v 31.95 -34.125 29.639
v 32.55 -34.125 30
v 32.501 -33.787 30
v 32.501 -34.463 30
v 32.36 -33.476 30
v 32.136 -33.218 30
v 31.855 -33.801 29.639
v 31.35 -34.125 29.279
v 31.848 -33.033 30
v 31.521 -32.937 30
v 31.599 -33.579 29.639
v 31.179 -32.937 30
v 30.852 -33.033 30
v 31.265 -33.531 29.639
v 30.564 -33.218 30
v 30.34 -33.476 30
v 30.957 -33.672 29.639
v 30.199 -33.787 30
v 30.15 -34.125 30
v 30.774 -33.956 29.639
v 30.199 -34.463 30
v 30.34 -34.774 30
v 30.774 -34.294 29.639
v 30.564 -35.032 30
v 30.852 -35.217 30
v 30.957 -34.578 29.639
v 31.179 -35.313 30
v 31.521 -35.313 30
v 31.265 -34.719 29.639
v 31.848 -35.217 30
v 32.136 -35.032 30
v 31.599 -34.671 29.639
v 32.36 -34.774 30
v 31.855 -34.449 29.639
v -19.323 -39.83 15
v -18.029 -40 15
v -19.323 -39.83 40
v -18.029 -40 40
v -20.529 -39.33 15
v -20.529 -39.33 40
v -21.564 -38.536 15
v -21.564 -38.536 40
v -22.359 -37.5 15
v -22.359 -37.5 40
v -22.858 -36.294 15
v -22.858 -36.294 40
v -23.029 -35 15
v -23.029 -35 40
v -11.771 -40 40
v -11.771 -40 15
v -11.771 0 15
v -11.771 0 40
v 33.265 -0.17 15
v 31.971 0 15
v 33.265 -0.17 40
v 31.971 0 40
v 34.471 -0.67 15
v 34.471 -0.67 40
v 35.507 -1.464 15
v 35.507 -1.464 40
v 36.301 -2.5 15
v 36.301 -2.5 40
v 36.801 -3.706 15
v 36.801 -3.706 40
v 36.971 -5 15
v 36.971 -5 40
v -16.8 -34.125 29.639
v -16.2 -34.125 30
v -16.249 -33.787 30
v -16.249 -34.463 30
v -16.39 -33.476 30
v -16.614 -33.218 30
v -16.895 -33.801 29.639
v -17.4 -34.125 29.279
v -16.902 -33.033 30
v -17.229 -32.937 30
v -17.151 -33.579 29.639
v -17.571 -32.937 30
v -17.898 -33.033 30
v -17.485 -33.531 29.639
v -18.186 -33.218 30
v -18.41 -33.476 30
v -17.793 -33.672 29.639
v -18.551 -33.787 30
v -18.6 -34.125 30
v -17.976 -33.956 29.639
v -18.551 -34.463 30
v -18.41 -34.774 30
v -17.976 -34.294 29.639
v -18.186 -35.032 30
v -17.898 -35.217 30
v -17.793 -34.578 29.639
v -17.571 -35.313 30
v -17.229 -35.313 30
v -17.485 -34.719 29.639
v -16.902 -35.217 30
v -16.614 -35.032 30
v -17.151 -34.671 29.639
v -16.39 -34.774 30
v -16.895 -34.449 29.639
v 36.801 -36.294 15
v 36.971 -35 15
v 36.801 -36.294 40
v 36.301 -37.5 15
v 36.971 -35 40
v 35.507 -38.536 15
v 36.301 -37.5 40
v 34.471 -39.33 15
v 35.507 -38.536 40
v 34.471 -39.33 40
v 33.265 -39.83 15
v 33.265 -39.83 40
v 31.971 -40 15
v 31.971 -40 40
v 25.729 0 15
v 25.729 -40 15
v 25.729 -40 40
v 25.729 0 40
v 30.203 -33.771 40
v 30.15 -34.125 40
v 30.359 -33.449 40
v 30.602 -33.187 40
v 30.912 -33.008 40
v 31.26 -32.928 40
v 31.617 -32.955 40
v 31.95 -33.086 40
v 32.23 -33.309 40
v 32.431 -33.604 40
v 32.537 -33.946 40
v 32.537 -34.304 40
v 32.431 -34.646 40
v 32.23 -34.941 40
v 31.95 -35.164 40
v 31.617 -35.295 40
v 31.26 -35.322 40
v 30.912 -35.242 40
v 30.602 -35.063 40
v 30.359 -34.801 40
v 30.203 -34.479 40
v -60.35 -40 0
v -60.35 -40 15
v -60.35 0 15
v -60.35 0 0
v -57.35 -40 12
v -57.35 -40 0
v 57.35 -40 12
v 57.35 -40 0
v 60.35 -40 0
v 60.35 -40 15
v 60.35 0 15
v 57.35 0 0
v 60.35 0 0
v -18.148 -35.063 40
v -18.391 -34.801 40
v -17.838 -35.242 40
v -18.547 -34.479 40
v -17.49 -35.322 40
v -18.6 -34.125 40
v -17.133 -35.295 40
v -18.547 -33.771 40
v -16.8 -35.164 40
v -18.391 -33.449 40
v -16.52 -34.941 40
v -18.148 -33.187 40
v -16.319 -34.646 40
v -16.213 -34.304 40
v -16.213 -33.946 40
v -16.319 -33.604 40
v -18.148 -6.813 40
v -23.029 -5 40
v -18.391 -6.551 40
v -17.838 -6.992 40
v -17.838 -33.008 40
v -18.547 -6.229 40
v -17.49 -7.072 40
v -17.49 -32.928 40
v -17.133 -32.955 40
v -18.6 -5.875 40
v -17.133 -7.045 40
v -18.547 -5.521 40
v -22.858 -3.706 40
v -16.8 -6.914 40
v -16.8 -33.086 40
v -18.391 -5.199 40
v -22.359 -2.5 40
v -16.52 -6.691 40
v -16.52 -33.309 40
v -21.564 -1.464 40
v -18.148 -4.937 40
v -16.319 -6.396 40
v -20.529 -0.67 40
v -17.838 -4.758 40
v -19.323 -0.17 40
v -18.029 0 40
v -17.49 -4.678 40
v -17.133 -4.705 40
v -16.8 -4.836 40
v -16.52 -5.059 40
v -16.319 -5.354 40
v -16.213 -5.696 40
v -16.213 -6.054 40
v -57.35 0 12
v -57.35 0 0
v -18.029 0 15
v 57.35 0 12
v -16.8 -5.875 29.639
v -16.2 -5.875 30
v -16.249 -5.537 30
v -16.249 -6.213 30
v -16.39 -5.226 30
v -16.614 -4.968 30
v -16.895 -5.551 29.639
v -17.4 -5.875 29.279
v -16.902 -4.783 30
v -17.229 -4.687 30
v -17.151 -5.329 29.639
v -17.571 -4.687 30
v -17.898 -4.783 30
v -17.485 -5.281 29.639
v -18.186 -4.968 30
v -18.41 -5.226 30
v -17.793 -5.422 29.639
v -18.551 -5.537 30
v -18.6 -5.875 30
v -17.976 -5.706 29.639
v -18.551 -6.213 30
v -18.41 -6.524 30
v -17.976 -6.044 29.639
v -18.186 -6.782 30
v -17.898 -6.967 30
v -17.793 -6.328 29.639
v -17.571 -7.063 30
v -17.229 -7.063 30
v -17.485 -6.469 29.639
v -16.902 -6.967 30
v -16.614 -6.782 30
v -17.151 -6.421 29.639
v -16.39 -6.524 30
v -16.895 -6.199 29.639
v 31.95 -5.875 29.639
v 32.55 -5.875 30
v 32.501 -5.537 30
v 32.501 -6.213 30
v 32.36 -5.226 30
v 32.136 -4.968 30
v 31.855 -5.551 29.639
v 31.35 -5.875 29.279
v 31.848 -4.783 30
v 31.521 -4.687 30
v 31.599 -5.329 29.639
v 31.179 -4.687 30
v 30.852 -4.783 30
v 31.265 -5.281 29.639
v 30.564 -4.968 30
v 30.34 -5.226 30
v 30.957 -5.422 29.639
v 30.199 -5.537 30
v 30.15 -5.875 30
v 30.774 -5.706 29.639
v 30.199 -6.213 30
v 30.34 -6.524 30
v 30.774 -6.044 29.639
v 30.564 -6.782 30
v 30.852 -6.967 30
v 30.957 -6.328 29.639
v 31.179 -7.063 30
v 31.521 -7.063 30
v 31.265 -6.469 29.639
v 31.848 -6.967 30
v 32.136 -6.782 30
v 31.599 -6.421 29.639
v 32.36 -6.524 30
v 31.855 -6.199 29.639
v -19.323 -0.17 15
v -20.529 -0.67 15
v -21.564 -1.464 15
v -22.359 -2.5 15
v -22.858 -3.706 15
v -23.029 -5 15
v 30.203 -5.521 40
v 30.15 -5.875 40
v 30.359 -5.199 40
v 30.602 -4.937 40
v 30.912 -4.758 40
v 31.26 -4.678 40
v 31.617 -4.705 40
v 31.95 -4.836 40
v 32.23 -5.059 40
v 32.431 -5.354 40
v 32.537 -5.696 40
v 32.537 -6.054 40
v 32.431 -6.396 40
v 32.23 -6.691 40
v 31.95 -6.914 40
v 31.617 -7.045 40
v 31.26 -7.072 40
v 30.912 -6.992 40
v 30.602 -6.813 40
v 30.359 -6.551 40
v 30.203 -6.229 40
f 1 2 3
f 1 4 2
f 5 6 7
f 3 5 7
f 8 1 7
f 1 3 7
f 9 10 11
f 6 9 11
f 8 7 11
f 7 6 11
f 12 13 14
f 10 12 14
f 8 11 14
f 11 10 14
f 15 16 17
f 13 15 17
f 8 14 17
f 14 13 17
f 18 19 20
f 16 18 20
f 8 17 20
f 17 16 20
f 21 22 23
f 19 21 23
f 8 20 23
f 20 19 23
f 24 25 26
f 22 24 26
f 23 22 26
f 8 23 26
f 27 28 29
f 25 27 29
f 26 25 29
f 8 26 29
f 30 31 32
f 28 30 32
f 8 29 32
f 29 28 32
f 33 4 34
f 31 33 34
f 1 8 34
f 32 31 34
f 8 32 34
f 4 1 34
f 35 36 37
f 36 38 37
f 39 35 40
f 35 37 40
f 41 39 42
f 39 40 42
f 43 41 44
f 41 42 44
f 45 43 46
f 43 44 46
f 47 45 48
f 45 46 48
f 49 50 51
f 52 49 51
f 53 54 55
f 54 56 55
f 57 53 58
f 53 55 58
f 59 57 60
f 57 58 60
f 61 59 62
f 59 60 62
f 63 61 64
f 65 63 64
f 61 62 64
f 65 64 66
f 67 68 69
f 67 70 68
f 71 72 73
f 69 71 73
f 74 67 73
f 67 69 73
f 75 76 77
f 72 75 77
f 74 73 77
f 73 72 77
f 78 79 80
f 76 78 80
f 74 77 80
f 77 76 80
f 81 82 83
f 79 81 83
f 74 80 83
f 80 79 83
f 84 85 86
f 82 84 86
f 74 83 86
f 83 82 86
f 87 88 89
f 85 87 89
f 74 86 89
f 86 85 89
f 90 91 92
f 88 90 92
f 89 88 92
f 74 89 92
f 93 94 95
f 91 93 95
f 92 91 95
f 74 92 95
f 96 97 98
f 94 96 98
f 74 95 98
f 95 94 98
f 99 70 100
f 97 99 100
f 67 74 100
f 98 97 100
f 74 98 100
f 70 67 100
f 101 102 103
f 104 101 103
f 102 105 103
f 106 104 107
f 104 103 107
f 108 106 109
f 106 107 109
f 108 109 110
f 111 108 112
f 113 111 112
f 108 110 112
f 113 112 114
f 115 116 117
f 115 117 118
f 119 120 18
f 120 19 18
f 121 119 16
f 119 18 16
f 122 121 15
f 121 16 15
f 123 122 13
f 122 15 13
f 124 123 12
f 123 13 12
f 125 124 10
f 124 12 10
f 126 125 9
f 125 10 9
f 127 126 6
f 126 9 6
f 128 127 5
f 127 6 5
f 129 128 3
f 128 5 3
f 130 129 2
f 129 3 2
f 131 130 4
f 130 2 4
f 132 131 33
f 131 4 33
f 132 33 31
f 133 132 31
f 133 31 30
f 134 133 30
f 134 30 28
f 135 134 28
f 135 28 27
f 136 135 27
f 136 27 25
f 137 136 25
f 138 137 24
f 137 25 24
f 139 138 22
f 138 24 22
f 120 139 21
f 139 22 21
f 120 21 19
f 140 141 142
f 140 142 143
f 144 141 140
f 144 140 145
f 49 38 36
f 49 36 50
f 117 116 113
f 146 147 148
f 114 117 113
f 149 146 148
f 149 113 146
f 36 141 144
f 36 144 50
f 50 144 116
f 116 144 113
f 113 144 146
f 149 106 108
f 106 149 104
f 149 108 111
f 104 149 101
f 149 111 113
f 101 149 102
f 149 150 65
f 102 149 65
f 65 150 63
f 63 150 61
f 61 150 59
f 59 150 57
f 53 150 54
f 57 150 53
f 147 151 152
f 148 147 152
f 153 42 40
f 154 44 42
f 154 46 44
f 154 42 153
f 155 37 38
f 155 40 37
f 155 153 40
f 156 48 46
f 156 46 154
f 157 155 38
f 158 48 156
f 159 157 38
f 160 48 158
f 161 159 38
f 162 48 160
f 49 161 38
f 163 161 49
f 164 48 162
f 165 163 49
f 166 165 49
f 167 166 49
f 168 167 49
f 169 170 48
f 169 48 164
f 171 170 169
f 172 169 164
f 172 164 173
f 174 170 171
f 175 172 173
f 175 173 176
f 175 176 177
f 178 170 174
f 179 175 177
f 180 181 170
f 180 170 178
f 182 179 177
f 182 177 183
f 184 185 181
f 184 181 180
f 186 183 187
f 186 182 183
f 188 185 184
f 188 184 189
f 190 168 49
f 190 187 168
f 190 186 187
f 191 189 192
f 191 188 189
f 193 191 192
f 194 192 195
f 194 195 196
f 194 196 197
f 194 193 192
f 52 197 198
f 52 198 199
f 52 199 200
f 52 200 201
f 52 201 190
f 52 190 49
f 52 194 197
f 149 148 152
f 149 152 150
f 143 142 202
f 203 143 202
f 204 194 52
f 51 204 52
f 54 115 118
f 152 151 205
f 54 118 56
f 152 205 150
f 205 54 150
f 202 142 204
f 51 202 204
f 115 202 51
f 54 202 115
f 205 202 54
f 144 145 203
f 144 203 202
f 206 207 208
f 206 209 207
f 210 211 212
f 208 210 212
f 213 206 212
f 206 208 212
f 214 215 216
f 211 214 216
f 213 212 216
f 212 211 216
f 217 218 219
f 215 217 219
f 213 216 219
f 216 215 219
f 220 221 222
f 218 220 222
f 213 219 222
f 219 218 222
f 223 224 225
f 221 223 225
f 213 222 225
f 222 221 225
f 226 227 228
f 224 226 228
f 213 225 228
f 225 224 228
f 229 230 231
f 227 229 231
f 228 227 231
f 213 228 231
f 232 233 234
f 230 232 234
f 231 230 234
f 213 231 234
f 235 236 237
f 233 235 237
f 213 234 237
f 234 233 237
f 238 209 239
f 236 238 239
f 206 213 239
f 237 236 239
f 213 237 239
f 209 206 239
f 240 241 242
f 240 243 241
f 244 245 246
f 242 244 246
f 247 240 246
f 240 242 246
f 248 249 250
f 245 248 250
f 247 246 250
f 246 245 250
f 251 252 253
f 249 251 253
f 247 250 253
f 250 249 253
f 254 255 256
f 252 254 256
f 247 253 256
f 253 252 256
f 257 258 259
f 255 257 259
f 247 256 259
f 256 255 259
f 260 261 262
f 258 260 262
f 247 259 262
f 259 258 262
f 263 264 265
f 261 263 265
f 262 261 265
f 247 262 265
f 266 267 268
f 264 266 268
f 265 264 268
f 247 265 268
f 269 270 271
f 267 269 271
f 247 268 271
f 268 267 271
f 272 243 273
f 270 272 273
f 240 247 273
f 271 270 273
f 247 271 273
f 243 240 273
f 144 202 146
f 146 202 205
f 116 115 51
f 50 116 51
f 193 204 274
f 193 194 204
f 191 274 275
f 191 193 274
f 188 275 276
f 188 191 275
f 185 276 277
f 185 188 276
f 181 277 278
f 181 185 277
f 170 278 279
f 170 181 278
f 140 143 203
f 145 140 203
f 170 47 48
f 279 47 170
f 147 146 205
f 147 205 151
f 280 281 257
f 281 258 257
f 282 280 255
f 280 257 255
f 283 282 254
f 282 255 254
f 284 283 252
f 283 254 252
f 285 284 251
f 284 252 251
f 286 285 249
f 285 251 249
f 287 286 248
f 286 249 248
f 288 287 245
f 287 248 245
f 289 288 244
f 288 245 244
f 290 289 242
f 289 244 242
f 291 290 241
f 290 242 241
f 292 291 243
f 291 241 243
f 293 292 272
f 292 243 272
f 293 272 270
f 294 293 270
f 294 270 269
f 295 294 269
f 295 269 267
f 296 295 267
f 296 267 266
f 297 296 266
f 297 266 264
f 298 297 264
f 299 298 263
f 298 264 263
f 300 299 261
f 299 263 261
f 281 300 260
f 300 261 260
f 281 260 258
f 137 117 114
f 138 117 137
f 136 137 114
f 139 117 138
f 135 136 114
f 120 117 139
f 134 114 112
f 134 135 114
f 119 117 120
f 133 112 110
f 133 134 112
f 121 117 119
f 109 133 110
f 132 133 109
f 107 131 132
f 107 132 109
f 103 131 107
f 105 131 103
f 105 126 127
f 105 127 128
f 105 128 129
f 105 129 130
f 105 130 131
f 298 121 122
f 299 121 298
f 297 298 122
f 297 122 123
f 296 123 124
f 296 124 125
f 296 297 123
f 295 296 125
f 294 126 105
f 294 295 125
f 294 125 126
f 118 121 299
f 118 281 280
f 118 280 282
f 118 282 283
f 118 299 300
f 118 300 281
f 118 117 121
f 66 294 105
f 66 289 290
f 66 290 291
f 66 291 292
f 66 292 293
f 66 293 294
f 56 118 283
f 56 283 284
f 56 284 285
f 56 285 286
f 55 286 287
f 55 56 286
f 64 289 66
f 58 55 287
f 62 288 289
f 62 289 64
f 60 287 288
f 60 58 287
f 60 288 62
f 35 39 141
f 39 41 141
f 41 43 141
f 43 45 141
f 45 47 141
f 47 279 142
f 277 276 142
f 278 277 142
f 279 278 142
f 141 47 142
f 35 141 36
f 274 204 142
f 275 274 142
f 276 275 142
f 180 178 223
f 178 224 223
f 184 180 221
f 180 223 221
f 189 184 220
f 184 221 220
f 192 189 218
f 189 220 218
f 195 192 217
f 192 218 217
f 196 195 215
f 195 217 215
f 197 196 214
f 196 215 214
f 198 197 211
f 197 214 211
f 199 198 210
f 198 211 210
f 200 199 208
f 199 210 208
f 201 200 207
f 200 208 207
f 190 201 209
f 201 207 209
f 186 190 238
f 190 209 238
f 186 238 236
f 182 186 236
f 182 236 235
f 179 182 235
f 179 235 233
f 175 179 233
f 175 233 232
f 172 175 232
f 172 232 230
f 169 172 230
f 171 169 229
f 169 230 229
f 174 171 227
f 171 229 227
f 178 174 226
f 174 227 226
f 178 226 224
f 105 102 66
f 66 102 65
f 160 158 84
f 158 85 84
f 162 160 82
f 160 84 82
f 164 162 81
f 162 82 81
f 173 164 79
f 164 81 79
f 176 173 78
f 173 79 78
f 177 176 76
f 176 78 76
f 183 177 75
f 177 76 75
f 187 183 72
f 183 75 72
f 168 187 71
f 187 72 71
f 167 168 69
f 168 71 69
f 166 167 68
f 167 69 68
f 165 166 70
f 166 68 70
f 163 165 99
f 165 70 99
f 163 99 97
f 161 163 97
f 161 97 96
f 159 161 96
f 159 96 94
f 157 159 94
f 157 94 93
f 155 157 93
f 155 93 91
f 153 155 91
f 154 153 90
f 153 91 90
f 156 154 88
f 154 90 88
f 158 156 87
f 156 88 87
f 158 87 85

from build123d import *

# Parameters (mm, degrees)
F1_DEPTH = 40
F2_W     = 11.2577080727
F2_H     = 40
F2_W_2   = 11.2422919273
F3_DEPTH = 25
F5_D     = 2.4
F5_DEPTH = 10
F5_TIP   = 0.7210327428
F6_R     = 5


with BuildPart() as f1:
    # F0 (on Front) → F1 (new body)
    with BuildSketch(Plane.XZ):
        Polygon((60.35, 15), (-60.35, 15), (-60.35, 0), (-57.35, 0), (-57.35, 12), (57.35, 12), (57.35, 0), (60.35, 0), align=None)
    extrude(amount=F1_DEPTH)

    # F2 (on face) → F3 (join)
    with BuildSketch(Plane.XY.offset(15)):
        with Locations((-17.4, -20)):
            Rectangle(F2_W, F2_H)
        with Locations((31.35, -20)):
            Rectangle(F2_W_2, F2_H)
    extrude(amount=F3_DEPTH)

    # F5
    with Locations(Plane.XY.offset(40)):
        with Locations((-17.4, -5.875), (31.35, -5.875), (31.35, -34.125), (-17.4, -34.125)):
            Hole(F5_D / 2, depth=F5_DEPTH)
            with Locations((0, 0, -(F5_DEPTH + F5_TIP / 2))):  # 118° drill point
                Cone(0, F5_D / 2, F5_TIP, mode=Mode.SUBTRACT)

    # F6
    f6_edges = [f1.edges().sort_by_distance(p)[0] for p in [
        (-23.028854, 0, 27.5),
        (36.971146, 0, 27.5),
        (36.971146, -40, 27.5),
        (-23.028854, -40, 27.5),
    ]]
    fillet(f6_edges, radius=F6_R)


solid = f1.part
